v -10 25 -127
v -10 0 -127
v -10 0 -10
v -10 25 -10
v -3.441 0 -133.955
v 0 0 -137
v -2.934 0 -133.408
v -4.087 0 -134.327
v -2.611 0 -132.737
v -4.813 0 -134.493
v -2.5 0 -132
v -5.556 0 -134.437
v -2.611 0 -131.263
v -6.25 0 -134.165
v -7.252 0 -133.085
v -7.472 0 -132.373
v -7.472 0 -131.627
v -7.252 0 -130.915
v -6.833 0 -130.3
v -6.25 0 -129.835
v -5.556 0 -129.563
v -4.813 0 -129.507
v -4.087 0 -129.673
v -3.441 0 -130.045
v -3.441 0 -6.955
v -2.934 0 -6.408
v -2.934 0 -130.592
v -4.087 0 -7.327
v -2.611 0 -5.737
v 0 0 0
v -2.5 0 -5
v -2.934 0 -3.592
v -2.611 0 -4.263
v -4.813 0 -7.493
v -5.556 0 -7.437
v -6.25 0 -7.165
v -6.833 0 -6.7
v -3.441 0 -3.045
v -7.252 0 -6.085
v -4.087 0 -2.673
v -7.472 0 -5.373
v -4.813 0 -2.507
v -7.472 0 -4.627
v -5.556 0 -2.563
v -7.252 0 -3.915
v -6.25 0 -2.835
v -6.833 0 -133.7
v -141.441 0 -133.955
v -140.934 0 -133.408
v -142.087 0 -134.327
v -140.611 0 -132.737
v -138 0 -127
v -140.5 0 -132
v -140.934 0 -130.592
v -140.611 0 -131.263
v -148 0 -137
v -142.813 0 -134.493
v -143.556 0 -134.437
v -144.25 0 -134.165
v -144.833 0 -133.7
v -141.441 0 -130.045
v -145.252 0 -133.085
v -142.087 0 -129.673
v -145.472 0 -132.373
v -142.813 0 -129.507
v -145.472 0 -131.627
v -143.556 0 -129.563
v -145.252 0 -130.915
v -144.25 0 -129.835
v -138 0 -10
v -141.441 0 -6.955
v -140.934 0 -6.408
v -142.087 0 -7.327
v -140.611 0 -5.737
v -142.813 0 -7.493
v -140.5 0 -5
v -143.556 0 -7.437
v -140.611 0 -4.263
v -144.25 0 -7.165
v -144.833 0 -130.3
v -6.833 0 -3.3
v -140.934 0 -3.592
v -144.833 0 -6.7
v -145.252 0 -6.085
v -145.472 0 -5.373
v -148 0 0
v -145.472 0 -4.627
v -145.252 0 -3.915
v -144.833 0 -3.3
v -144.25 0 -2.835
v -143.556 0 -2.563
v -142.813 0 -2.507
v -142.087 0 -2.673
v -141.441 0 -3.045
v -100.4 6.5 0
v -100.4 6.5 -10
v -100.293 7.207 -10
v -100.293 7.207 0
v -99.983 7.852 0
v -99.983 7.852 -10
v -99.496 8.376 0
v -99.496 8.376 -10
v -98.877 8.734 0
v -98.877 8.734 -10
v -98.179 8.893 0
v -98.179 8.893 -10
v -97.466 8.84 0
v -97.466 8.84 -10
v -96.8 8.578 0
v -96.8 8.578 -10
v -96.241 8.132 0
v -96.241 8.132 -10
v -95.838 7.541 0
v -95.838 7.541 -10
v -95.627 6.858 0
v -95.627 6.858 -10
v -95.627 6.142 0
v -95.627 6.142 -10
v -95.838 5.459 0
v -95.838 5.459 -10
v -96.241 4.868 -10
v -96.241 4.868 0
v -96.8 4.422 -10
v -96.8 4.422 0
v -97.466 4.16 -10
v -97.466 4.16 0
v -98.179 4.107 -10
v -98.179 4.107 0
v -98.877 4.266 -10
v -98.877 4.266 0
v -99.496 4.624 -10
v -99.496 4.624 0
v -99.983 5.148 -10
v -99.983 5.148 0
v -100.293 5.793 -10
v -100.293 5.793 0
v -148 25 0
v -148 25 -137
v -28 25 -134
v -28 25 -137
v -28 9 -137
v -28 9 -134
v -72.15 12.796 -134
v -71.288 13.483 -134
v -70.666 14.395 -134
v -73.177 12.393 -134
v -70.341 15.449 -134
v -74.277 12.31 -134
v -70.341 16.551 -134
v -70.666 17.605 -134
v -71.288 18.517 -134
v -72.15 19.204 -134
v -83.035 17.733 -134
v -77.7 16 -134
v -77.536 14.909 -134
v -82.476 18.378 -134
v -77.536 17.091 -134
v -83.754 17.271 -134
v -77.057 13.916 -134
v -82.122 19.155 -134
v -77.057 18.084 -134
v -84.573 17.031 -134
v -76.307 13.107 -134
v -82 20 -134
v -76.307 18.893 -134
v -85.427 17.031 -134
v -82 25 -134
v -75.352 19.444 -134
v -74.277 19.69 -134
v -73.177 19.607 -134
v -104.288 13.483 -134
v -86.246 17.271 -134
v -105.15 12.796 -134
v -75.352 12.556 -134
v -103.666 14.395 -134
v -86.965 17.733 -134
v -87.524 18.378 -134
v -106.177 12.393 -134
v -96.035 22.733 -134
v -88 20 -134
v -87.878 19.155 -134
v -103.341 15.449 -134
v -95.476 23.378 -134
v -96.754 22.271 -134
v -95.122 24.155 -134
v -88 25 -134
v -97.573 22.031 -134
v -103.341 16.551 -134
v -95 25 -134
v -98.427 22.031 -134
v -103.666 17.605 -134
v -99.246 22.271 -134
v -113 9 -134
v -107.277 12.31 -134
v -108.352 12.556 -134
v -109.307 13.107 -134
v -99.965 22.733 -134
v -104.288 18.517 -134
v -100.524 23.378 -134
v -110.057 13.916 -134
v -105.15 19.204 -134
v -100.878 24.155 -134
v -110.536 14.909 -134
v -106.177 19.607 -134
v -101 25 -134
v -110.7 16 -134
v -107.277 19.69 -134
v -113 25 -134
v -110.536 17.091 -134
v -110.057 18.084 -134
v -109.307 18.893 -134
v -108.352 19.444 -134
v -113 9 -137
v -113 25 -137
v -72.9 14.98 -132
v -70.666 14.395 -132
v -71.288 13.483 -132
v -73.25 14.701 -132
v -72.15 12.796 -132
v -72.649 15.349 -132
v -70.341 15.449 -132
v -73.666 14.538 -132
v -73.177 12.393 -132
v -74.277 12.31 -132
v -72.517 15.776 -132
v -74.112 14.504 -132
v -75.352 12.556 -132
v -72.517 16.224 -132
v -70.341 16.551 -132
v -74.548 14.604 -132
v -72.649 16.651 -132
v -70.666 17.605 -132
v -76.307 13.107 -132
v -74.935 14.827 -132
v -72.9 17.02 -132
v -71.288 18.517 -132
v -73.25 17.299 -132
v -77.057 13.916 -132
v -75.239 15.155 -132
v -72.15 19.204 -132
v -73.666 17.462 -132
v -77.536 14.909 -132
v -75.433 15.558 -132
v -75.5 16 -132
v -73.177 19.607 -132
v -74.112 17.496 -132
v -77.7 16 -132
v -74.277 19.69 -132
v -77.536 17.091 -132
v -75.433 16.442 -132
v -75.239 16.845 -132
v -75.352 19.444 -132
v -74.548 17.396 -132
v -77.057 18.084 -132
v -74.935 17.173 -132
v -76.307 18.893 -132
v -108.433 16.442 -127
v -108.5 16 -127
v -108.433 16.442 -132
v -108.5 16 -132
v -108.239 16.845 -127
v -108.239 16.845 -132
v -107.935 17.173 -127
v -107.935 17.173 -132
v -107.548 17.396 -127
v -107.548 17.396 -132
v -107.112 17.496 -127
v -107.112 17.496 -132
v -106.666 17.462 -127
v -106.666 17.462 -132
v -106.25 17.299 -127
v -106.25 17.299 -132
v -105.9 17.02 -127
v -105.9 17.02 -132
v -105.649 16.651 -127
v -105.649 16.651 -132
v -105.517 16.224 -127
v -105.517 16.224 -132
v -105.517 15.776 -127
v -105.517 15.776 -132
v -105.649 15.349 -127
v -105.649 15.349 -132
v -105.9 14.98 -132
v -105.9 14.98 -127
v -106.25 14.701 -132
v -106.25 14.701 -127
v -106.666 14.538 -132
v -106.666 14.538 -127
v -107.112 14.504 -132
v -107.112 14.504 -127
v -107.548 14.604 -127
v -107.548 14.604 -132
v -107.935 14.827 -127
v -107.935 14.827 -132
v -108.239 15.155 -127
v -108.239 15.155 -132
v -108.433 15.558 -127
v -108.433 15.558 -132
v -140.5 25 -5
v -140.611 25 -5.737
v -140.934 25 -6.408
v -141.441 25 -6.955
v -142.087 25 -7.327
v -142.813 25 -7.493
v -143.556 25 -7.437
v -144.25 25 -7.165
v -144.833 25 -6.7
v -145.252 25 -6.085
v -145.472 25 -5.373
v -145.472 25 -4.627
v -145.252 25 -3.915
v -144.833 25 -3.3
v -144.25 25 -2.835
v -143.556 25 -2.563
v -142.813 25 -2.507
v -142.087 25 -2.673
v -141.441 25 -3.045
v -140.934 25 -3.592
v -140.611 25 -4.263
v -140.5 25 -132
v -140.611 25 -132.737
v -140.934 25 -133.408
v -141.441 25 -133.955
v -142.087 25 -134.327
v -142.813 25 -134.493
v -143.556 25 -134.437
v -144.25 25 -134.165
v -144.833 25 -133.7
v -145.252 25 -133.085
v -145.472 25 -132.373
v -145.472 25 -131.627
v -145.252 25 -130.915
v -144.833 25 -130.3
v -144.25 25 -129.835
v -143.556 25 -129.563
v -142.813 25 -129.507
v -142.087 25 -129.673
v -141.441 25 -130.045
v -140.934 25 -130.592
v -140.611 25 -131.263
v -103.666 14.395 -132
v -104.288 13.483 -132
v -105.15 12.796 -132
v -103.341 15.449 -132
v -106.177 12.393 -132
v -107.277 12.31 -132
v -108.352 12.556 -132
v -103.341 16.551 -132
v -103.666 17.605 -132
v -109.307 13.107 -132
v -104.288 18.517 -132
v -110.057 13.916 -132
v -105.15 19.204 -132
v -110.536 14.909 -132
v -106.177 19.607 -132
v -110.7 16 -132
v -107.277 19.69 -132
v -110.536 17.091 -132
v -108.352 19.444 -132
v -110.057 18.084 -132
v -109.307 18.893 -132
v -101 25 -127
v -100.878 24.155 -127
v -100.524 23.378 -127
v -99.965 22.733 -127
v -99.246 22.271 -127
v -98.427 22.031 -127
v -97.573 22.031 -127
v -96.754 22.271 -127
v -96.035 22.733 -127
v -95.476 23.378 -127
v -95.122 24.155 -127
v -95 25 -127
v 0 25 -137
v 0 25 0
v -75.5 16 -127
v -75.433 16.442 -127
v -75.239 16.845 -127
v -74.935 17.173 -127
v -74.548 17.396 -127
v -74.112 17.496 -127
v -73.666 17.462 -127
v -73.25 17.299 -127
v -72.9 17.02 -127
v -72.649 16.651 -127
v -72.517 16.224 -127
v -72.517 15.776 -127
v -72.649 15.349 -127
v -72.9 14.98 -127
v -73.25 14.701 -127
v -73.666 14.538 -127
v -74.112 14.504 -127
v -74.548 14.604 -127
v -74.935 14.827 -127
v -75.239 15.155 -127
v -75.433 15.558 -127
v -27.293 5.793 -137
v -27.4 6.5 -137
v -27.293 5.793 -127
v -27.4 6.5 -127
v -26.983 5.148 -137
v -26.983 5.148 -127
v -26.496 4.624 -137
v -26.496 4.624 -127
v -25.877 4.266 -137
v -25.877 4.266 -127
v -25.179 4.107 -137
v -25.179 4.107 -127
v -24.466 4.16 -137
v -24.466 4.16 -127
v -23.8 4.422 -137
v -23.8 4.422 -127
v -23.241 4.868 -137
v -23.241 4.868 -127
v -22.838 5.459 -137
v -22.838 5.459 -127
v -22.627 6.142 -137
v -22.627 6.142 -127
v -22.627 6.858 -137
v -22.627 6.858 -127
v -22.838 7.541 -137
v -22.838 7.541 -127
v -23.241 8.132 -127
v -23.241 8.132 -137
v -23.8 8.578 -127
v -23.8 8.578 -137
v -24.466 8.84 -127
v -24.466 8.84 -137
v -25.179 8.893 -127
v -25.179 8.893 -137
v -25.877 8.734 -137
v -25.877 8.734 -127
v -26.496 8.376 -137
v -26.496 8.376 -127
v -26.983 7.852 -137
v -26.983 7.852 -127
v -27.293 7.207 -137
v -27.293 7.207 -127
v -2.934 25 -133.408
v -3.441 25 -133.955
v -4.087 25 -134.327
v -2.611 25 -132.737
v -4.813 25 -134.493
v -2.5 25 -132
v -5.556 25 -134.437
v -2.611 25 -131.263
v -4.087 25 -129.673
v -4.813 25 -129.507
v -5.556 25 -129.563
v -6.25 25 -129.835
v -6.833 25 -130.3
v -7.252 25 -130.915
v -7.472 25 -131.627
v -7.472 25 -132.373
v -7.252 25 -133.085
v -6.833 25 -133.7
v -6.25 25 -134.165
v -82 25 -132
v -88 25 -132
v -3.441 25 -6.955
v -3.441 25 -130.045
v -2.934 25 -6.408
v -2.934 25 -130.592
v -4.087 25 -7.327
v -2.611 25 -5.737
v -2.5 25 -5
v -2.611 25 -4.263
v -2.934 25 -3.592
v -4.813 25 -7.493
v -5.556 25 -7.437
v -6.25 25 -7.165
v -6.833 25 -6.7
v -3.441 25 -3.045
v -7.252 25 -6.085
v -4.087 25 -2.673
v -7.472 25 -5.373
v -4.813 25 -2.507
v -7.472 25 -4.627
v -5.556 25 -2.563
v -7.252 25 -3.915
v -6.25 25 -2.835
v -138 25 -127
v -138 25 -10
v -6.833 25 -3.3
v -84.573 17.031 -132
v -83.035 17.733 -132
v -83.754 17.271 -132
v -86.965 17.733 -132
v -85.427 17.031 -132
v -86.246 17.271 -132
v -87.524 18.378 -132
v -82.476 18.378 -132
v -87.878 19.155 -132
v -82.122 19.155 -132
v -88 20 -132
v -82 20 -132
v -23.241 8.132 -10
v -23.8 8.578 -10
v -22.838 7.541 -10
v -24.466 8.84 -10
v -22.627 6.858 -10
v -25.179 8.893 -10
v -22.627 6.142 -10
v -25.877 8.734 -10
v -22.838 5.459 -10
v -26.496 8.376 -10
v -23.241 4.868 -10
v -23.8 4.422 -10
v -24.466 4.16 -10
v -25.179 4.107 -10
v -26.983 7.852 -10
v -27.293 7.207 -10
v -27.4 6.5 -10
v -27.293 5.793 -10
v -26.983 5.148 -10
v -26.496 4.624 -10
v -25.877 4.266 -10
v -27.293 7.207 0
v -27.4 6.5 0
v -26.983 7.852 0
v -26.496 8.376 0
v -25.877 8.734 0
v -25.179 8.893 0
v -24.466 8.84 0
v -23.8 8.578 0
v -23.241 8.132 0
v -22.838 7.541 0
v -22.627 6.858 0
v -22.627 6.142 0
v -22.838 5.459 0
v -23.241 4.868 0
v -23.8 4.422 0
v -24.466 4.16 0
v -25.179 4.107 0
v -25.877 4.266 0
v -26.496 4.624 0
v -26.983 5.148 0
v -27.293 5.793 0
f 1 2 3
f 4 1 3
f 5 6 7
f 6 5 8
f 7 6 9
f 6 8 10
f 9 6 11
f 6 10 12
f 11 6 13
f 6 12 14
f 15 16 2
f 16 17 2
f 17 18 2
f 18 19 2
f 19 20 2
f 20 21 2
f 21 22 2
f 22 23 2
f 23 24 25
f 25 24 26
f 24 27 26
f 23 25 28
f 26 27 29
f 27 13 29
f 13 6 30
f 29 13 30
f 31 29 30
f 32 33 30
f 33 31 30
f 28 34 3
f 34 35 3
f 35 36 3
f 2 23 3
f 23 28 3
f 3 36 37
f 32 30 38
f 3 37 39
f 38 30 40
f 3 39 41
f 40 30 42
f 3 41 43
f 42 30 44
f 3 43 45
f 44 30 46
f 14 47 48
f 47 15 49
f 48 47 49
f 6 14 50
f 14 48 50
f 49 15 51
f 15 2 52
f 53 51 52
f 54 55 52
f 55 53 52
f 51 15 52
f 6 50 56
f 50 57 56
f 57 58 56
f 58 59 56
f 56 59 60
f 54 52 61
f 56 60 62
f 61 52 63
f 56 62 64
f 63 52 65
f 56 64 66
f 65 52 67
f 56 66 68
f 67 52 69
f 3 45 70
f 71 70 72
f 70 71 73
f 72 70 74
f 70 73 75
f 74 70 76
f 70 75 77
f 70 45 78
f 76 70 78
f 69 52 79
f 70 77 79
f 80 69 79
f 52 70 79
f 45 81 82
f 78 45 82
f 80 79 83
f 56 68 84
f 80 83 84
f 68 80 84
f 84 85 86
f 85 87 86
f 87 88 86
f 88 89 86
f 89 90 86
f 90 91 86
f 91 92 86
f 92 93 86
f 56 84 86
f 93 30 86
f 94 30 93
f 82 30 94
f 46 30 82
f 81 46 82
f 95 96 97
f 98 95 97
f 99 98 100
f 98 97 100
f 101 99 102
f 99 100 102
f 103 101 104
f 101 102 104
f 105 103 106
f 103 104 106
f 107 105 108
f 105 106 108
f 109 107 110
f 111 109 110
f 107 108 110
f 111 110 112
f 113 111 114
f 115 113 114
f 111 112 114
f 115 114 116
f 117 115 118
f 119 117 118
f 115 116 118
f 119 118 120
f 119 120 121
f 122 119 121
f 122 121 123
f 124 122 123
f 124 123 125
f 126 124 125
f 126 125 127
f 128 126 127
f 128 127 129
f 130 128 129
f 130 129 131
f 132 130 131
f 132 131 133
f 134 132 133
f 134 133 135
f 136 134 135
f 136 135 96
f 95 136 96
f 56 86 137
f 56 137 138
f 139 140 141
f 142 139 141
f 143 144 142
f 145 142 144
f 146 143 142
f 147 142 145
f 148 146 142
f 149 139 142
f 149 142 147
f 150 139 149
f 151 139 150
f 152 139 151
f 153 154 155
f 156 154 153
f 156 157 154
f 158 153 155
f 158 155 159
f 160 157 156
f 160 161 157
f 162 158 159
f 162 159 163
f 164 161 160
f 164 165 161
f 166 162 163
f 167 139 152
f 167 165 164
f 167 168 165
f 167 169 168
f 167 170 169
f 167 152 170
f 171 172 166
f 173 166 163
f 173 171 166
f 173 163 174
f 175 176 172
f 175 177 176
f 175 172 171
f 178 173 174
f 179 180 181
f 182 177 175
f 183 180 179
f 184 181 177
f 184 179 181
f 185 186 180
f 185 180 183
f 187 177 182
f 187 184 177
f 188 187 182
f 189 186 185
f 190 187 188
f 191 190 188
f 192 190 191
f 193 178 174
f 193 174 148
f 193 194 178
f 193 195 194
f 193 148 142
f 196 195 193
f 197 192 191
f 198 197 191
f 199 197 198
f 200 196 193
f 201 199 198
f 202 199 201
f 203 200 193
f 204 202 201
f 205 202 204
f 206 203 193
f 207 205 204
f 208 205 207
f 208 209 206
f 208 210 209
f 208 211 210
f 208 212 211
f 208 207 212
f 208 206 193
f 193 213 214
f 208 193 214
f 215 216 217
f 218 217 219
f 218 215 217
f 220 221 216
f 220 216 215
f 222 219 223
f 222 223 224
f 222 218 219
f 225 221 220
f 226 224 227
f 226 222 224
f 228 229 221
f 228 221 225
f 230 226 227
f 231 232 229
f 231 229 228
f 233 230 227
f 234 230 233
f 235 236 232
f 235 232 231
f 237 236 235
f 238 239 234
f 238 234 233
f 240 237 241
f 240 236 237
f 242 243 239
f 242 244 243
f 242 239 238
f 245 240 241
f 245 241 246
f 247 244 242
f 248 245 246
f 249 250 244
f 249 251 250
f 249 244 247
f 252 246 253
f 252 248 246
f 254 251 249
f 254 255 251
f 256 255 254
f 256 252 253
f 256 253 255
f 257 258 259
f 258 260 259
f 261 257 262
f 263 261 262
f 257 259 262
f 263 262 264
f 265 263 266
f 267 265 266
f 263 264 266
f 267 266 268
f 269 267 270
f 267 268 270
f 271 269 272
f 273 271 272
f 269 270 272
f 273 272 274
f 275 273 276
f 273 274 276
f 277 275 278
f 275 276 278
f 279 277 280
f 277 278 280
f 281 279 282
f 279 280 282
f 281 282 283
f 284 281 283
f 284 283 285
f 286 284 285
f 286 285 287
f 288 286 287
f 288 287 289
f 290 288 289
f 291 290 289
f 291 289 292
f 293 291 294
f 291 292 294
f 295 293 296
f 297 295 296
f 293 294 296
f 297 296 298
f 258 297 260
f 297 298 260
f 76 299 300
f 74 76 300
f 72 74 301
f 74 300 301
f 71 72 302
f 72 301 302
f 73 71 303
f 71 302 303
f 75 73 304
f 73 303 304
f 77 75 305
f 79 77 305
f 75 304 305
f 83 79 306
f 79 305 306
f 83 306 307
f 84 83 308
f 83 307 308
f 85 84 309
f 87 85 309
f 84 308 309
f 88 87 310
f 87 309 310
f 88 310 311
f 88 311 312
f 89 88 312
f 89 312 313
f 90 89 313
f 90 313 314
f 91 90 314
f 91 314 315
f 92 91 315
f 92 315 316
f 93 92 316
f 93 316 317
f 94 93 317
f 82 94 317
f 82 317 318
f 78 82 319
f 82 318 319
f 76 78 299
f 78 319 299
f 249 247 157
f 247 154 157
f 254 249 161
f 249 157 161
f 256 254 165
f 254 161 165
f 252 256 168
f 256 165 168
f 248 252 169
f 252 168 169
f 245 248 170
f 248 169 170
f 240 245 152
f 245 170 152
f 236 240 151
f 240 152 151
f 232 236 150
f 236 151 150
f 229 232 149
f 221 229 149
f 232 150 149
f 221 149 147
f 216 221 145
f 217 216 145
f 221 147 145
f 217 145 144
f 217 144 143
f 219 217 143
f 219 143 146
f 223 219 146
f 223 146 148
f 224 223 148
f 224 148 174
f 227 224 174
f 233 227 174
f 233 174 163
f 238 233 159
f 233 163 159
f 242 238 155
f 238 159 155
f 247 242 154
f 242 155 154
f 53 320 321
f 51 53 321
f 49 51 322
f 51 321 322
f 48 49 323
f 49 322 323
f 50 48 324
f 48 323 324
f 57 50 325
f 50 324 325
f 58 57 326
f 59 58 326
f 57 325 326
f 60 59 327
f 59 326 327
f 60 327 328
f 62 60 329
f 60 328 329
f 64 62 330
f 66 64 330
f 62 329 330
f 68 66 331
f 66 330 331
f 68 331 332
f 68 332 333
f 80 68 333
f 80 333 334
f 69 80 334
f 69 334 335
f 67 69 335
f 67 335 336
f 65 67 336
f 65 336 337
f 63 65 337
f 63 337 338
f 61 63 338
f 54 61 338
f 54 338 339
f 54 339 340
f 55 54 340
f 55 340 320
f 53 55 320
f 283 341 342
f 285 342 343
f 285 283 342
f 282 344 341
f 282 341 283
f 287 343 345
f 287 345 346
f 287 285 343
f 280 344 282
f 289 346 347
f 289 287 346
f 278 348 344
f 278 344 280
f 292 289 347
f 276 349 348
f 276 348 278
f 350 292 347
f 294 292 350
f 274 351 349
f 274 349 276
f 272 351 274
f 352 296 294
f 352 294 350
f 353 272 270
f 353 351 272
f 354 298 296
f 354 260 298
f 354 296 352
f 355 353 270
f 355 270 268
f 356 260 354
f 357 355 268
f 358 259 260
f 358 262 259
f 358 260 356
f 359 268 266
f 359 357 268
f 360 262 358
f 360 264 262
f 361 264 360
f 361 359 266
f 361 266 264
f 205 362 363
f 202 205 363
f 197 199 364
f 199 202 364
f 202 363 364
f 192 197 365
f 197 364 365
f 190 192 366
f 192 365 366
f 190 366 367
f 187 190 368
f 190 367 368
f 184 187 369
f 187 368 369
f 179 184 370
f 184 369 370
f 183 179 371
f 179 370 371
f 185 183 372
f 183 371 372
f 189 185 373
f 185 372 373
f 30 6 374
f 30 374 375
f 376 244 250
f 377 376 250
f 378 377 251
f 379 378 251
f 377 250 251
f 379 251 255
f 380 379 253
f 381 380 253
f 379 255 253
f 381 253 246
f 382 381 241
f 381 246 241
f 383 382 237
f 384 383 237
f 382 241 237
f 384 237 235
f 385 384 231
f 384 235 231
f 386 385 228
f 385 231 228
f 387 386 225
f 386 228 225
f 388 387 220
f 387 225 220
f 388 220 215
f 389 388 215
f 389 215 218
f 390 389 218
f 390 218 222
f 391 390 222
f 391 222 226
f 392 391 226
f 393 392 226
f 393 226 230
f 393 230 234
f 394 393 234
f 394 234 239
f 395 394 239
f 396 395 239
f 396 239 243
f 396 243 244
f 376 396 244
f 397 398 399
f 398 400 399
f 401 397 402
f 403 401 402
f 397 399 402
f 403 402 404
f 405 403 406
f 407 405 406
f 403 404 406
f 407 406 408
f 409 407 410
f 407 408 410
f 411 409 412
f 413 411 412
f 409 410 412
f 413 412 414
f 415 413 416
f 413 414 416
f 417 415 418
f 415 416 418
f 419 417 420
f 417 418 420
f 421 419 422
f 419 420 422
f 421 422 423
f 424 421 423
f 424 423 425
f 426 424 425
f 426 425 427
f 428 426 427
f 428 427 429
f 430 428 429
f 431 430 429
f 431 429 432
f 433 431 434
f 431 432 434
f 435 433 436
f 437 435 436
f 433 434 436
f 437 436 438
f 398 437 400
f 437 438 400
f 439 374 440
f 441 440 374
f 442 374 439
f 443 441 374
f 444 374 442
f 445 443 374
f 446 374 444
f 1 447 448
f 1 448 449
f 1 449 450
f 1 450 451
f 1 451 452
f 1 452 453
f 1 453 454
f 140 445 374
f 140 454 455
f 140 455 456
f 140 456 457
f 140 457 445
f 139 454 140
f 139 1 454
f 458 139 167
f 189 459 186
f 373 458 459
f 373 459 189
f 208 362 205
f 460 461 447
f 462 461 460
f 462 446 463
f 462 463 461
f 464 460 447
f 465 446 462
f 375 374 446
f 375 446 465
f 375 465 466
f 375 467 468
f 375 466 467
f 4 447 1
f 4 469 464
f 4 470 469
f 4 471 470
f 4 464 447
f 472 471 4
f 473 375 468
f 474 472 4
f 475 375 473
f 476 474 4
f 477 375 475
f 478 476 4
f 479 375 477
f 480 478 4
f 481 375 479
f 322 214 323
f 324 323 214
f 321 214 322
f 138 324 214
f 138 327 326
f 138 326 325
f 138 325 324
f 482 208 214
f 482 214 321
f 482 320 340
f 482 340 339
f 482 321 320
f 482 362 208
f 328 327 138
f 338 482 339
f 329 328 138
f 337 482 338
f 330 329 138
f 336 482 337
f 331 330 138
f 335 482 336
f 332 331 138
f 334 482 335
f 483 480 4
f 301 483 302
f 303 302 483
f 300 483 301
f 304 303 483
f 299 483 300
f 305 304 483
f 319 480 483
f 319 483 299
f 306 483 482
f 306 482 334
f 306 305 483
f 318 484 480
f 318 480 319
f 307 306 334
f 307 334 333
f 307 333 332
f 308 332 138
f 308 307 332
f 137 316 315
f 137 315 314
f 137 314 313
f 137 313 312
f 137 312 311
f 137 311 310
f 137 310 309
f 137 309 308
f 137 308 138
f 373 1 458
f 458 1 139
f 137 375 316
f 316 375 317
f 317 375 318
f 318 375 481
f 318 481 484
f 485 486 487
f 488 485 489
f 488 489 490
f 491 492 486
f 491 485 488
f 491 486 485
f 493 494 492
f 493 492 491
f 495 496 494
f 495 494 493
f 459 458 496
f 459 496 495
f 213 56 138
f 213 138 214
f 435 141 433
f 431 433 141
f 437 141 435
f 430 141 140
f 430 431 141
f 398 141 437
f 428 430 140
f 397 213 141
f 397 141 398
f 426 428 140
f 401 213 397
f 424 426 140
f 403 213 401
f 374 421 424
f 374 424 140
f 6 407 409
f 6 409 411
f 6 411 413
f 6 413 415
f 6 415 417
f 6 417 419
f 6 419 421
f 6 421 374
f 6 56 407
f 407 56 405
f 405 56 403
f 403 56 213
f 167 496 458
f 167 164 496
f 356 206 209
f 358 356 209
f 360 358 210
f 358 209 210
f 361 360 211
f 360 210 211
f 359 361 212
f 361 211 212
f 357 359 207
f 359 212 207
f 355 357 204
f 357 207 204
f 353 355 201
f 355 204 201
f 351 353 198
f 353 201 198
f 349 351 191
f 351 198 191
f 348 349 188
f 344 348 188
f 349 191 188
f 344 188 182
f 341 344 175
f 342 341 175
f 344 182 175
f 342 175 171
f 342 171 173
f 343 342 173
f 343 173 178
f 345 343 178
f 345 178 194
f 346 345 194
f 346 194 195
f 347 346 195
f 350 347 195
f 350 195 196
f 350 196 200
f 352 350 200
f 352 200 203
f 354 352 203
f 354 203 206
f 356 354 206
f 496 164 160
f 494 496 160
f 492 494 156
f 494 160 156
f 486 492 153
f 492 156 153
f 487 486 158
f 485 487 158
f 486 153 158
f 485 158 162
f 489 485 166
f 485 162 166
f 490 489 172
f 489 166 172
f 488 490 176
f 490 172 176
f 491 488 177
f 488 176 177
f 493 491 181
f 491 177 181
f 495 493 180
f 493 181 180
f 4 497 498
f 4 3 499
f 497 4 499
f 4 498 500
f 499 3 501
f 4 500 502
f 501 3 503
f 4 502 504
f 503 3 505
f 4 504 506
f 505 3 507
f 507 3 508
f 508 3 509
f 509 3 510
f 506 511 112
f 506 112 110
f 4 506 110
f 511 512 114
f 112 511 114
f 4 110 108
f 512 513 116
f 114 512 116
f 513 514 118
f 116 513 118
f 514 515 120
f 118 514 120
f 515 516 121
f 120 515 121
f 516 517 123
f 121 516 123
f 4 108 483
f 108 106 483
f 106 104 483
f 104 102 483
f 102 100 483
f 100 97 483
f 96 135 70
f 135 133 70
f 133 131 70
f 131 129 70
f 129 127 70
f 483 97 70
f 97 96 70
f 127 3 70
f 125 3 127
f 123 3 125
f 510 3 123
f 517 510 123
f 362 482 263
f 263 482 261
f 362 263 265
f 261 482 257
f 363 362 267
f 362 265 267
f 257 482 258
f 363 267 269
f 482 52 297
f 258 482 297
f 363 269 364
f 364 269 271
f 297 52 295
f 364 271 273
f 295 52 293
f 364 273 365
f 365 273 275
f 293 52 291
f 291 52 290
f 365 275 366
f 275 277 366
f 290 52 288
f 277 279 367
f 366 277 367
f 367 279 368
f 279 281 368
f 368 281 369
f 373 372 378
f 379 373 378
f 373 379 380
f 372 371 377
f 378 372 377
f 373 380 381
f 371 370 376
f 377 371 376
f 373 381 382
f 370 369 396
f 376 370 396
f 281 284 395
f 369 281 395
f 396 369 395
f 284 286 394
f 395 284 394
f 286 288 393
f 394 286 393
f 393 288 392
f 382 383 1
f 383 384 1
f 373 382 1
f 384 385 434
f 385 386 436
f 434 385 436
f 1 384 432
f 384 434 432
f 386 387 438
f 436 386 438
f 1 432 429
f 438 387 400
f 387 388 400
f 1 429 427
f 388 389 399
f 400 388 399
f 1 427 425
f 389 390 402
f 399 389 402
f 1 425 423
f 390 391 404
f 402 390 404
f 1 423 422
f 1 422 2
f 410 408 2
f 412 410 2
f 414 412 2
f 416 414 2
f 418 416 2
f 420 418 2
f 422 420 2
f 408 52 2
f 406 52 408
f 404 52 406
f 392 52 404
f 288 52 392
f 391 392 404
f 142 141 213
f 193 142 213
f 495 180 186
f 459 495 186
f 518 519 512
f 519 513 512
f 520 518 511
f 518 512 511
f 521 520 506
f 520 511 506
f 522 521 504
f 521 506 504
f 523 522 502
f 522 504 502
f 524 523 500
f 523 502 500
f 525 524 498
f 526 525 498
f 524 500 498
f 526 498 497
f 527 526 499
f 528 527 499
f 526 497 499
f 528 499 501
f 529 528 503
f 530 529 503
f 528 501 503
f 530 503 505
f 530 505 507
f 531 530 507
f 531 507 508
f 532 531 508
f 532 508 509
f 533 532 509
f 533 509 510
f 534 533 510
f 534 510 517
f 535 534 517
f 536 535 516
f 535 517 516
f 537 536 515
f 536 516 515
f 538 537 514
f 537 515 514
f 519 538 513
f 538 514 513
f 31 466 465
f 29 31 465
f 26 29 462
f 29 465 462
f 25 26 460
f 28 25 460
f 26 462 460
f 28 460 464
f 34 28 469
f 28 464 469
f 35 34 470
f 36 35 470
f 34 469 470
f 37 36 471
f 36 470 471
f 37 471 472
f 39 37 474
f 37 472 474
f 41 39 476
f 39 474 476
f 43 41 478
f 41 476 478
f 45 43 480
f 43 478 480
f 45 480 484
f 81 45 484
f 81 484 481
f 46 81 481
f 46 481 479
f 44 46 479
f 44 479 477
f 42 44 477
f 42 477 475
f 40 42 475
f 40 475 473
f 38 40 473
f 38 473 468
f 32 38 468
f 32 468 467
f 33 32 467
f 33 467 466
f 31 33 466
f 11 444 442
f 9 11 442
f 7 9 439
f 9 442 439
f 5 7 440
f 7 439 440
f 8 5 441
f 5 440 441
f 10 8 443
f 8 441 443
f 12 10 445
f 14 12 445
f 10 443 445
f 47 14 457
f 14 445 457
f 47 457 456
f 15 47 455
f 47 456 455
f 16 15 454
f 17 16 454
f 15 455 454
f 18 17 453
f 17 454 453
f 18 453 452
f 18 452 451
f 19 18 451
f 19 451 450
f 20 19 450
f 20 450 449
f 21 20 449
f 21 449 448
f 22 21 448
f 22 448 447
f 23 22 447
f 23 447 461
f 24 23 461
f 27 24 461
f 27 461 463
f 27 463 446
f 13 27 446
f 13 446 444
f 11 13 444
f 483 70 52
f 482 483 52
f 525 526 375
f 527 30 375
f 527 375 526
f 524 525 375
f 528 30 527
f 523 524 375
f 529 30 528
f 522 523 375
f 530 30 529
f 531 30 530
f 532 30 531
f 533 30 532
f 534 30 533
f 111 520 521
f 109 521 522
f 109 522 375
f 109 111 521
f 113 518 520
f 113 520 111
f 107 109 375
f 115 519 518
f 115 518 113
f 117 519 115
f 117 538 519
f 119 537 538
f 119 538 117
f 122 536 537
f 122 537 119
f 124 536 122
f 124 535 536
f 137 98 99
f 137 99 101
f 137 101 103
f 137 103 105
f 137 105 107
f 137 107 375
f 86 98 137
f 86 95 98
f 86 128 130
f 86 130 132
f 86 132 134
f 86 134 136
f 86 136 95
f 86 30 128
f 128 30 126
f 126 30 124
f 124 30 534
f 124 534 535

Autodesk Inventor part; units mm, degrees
ref_plane "YZ Plane" through (0, 0, 0) normal (1, 0, 0) x (0, 1, 0)
ref_plane "XZ Plane" through (0, 0, 0) normal (0, 1, 0) x (-1, 0, 0)
sketch "Эскиз1" plane through (0, 0, 0) normal (0, 1, 0) x (-1, 0, 0)
  line L0 (0, 0) -> (148, 0)
  line L1 (148, 0) -> (148, -137)
  line L2 (148, -137) -> (0, -137)
  line L3 (0, -137) -> (0, 0)
  line L4 (10, -10) -> (138, -10)
  line L5 (138, -10) -> (138, -127)
  line L6 (138, -127) -> (10, -127)
  line L7 (10, -127) -> (10, -10)
  line L8 (0, 0) -> (5.5771, 0)
  dimension "d0" = 148
  dimension "d2" = 10
  dimension "d3" = 10
  dimension "d4" = 10
  dimension "d5" = 10
  dimension "d8" = 117
extrude "Выдавливание1" add sketch "Эскиз1" along normal blind 25
sketch "Эскиз2" plane through (0, 25, 0) normal (0, 1, 0) x (1, 0, 0)
  line L0 (0, 0) -> (0, 137) projected
  line L1 (-148, 0) -> (0, 0) projected
  line L2 (0, 5) -> (-148, 5)
  line L3 (-148, 137) -> (-148, 0) projected
  line L4 (-143, 0) -> (-148, 0)
  line L5 (-143, 0) -> (-143, 137)
  line L6 (0, 137) -> (-148, 137) projected
  circle A0 centre (-143, 5) radius 2.5
  dimension "d9" = 5
  dimension "d12" = 5
  dimension "d20" = 5
extrude "Выдавливание2" cut sketch "Эскиз2" against normal through all contours A0 L5 L2 | L2 L5 A0 | A0 L2 L5 | L2 A0 L5
sketch "Эскиз6" plane through (0, 25, 0) normal (0, 1, 0) x (1, 0, 0)
  line L0 (-98, 137) -> (-98, 127)
  line L1 (-138, 127) -> (-10, 127) projected
  line L2 (-148, 137) -> (-148, 0) projected
  line L3 (-98, 127) -> (-101, 127)
  line L4 (-101, 137) -> (-101, 127)
  line L5 (-101, 137) -> (-98, 137)
  line L6 (0, 137) -> (-148, 137) projected
  point P0 (0, 0)
  dimension "d46" = 50
  dimension "d47" = 6
  dimension "d86" = 10
revolve "Вращение3" cut sketch "Эскиз6" angle 360 about axis through (-98, 25, -137) along (0, 0, 1)
sketch "Эскиз8" plane through (0, 25, 0) normal (0, 1, 0) x (1, 0, 0)
  circle A0 centre (-143, 5) radius 2.5 projected
  line L0 (-143, 5) -> (-48, 5)
  circle A1 centre (-5, 5) radius 2.5
  line L1 (0, 0) -> (0, 137) projected
  dimension "d56" = 5
  dimension "d57" = 5
extrude "Выдавливание4" cut sketch "Эскиз8" against normal through all contours A1
sketch "Эскиз9" plane through (0, 25, 0) normal (0, 1, 0) x (1, 0, 0)
  circle A0 centre (-5, 5) radius 2.5 projected
  line L0 (-5, 5) -> (-5, 137)
  line L1 (0, 137) -> (-148, 137) projected
  circle A1 centre (-5, 132) radius 2.5
  point P0 (0, 0)
  point P1 (0, 137)
  point P2 (-85.5, 143)
  dimension "d60" = 5
  dimension "d61" = 5
extrude "Выдавливание5" cut sketch "Эскиз9" against normal through all contours A1 L0 | L0 A1
sketch "Эскиз10" plane through (0, 25, 0) normal (0, 1, 0) x (1, 0, 0)
  circle A0 centre (-143, 5) radius 2.5 projected
  line L0 (-143, 5) -> (-143, 137)
  line L1 (-148, 137) -> (0, 137) projected
  circle A1 centre (-5, 132) radius 2.5 projected
  line L2 (-5, 132) -> (-148, 132)
  line L3 (-148, 0) -> (-148, 137) projected
  circle A2 centre (-143, 132) radius 2.5
  point P0 (0, 0)
  dimension "d64" = 5
extrude "Выдавливание6" cut sketch "Эскиз10" against normal through all contours A2 L2 L0 | L0 L2 A2 | L2 A2 L0 | L0 A2 L2
sketch "Эскиз11" plane through (-10, 0, -10) normal (0, 0, -1) x (-1, 0, 0)
  line L0 (0, 25) -> (128, 25) projected
  circle A0 centre (88, 25) radius 18.5
  line L1 (128, 0) -> (0, 0) projected
  circle A1 centre (88, 6.5) radius 2.4
  line L2 (88, 25) -> (88, 6.5)
  line L3 (88, 25) -> (69.5, 25)
  point P0 (-10, 0)
  point P1 (-10, 25)
  point P2 (138, 25)
  dimension "d67" = 37
  dimension "d69" = 4.8
  dimension "d79" = 50
  dimension "d85" = 90
extrude "Выдавливание7" cut sketch "Эскиз11" against normal through all contours A1 L2 A0 | A0 A1 | A1 A0 L2
pattern_linear "Прямоуг.массив3" count 2 spacing -73 along (-1, 0, 0) of "Выдавливание7"
ref_plane "РабПлоскость1" through (0, 0, -68.5) normal (0, 0, 1) x (1, 0, 0)
mirror "Зеркальное отражение1" about plane through (0, 0, -68.5) normal (0, 0, 1) of "Прямоуг.массив3"
sketch "Эскиз14" plane through (0, 0, -137) normal (0, 0, -1) x (-1, 0, 0)
  arc A0 (95, 25) -> (101, 25) centre (98, 25) ccw projected
  line L0 (113, 9) -> (113, 25)
  line L1 (138, 25) -> (101, 25) projected
  line L2 (113, 25) -> (28, 25)
  line L3 (0, 25) -> (95, 25) projected
  line L4 (28, 25) -> (28, 9)
  line L5 (28, 9) -> (113, 9)
  point P0 (0, 0)
  point P1 (148, 25)
  dimension "d89" = 85
  dimension "d90" = 16
  dimension "d91" = 35
extrude "Выдавливание8" cut sketch "Эскиз14" against normal blind 3 contours A0 L1 L0 L5 L4 L2
sketch "Эскиз15" plane through (0, 0, -134) normal (0, 0, -1) x (-1, 0, 0)
  arc A0 (95, 25) -> (101, 25) centre (98, 25) ccw projected
  line L0 (148, 25) -> (0, 25) projected
  line L1 (113, 9) -> (107, 9)
  line L2 (113, 9) -> (28, 9) projected
  line L3 (107, 9) -> (107, 16)
  circle A1 centre (107, 16) radius 1.5
  point P0 (0, 0)
  dimension "d98" = 6
  dimension "d99" = 7
  dimension "d100" = 3
extrude "Выдавливание9" cut sketch "Эскиз15" against normal up to next contours A1
sketch "Эскиз16" plane through (0, 0, -134) normal (0, 0, -1) x (-1, 0, 0)
  line L0 (113, 9) -> (28, 9) projected
  circle A0 centre (107, 16) radius 1.5 projected
  line L1 (107, 16) -> (74, 16)
  circle A1 centre (74, 16) radius 1.5
  point P0 (0, 0)
  dimension "d106" = 33
  dimension "d107" = 3
extrude "Выдавливание10" cut sketch "Эскиз16" against normal up to next contours A1
sketch "Эскиз17" plane through (0, 0, -134) normal (0, 0, -1) x (-1, 0, 0)
  circle A0 centre (74, 16) radius 1.5 projected
  circle A1 centre (74, 16) radius 3.7
  point P0 (0, 0)
  dimension "d110" = 7.4
extrude "Выдавливание11" cut sketch "Эскиз17" against normal blind 2
sketch "Эскиз18" plane through (0, 0, -134) normal (0, 0, -1) x (-1, 0, 0)
  circle A0 centre (107, 16) radius 1.5 projected
  circle A1 centre (107, 16) radius 3.7
  point P0 (0, 0)
  dimension "d113" = 7.4
extrude "Выдавливание12" cut sketch "Эскиз18" against normal blind 2
sketch "Эскиз19" plane through (0, 0, -134) normal (0, 0, -1) x (-1, 0, 0)
  arc A0 (82, 20) -> (88, 20) centre (85, 20) ccw
  line L0 (113, 9) -> (28, 9) projected
  line L1 (113, 25) -> (113, 9) projected
  line L2 (10, 25) -> (138, 25) projected
  line L3 (82, 20) -> (82, 25)
  line L4 (88, 20) -> (88, 25)
  point P0 (0, 0)
  dimension "d121" = 6
  dimension "d123" = 25
  dimension "d124" = 11
extrude "Выдавливание13" cut sketch "Эскиз19" against normal blind 2
properties part number "Корпус низ"
